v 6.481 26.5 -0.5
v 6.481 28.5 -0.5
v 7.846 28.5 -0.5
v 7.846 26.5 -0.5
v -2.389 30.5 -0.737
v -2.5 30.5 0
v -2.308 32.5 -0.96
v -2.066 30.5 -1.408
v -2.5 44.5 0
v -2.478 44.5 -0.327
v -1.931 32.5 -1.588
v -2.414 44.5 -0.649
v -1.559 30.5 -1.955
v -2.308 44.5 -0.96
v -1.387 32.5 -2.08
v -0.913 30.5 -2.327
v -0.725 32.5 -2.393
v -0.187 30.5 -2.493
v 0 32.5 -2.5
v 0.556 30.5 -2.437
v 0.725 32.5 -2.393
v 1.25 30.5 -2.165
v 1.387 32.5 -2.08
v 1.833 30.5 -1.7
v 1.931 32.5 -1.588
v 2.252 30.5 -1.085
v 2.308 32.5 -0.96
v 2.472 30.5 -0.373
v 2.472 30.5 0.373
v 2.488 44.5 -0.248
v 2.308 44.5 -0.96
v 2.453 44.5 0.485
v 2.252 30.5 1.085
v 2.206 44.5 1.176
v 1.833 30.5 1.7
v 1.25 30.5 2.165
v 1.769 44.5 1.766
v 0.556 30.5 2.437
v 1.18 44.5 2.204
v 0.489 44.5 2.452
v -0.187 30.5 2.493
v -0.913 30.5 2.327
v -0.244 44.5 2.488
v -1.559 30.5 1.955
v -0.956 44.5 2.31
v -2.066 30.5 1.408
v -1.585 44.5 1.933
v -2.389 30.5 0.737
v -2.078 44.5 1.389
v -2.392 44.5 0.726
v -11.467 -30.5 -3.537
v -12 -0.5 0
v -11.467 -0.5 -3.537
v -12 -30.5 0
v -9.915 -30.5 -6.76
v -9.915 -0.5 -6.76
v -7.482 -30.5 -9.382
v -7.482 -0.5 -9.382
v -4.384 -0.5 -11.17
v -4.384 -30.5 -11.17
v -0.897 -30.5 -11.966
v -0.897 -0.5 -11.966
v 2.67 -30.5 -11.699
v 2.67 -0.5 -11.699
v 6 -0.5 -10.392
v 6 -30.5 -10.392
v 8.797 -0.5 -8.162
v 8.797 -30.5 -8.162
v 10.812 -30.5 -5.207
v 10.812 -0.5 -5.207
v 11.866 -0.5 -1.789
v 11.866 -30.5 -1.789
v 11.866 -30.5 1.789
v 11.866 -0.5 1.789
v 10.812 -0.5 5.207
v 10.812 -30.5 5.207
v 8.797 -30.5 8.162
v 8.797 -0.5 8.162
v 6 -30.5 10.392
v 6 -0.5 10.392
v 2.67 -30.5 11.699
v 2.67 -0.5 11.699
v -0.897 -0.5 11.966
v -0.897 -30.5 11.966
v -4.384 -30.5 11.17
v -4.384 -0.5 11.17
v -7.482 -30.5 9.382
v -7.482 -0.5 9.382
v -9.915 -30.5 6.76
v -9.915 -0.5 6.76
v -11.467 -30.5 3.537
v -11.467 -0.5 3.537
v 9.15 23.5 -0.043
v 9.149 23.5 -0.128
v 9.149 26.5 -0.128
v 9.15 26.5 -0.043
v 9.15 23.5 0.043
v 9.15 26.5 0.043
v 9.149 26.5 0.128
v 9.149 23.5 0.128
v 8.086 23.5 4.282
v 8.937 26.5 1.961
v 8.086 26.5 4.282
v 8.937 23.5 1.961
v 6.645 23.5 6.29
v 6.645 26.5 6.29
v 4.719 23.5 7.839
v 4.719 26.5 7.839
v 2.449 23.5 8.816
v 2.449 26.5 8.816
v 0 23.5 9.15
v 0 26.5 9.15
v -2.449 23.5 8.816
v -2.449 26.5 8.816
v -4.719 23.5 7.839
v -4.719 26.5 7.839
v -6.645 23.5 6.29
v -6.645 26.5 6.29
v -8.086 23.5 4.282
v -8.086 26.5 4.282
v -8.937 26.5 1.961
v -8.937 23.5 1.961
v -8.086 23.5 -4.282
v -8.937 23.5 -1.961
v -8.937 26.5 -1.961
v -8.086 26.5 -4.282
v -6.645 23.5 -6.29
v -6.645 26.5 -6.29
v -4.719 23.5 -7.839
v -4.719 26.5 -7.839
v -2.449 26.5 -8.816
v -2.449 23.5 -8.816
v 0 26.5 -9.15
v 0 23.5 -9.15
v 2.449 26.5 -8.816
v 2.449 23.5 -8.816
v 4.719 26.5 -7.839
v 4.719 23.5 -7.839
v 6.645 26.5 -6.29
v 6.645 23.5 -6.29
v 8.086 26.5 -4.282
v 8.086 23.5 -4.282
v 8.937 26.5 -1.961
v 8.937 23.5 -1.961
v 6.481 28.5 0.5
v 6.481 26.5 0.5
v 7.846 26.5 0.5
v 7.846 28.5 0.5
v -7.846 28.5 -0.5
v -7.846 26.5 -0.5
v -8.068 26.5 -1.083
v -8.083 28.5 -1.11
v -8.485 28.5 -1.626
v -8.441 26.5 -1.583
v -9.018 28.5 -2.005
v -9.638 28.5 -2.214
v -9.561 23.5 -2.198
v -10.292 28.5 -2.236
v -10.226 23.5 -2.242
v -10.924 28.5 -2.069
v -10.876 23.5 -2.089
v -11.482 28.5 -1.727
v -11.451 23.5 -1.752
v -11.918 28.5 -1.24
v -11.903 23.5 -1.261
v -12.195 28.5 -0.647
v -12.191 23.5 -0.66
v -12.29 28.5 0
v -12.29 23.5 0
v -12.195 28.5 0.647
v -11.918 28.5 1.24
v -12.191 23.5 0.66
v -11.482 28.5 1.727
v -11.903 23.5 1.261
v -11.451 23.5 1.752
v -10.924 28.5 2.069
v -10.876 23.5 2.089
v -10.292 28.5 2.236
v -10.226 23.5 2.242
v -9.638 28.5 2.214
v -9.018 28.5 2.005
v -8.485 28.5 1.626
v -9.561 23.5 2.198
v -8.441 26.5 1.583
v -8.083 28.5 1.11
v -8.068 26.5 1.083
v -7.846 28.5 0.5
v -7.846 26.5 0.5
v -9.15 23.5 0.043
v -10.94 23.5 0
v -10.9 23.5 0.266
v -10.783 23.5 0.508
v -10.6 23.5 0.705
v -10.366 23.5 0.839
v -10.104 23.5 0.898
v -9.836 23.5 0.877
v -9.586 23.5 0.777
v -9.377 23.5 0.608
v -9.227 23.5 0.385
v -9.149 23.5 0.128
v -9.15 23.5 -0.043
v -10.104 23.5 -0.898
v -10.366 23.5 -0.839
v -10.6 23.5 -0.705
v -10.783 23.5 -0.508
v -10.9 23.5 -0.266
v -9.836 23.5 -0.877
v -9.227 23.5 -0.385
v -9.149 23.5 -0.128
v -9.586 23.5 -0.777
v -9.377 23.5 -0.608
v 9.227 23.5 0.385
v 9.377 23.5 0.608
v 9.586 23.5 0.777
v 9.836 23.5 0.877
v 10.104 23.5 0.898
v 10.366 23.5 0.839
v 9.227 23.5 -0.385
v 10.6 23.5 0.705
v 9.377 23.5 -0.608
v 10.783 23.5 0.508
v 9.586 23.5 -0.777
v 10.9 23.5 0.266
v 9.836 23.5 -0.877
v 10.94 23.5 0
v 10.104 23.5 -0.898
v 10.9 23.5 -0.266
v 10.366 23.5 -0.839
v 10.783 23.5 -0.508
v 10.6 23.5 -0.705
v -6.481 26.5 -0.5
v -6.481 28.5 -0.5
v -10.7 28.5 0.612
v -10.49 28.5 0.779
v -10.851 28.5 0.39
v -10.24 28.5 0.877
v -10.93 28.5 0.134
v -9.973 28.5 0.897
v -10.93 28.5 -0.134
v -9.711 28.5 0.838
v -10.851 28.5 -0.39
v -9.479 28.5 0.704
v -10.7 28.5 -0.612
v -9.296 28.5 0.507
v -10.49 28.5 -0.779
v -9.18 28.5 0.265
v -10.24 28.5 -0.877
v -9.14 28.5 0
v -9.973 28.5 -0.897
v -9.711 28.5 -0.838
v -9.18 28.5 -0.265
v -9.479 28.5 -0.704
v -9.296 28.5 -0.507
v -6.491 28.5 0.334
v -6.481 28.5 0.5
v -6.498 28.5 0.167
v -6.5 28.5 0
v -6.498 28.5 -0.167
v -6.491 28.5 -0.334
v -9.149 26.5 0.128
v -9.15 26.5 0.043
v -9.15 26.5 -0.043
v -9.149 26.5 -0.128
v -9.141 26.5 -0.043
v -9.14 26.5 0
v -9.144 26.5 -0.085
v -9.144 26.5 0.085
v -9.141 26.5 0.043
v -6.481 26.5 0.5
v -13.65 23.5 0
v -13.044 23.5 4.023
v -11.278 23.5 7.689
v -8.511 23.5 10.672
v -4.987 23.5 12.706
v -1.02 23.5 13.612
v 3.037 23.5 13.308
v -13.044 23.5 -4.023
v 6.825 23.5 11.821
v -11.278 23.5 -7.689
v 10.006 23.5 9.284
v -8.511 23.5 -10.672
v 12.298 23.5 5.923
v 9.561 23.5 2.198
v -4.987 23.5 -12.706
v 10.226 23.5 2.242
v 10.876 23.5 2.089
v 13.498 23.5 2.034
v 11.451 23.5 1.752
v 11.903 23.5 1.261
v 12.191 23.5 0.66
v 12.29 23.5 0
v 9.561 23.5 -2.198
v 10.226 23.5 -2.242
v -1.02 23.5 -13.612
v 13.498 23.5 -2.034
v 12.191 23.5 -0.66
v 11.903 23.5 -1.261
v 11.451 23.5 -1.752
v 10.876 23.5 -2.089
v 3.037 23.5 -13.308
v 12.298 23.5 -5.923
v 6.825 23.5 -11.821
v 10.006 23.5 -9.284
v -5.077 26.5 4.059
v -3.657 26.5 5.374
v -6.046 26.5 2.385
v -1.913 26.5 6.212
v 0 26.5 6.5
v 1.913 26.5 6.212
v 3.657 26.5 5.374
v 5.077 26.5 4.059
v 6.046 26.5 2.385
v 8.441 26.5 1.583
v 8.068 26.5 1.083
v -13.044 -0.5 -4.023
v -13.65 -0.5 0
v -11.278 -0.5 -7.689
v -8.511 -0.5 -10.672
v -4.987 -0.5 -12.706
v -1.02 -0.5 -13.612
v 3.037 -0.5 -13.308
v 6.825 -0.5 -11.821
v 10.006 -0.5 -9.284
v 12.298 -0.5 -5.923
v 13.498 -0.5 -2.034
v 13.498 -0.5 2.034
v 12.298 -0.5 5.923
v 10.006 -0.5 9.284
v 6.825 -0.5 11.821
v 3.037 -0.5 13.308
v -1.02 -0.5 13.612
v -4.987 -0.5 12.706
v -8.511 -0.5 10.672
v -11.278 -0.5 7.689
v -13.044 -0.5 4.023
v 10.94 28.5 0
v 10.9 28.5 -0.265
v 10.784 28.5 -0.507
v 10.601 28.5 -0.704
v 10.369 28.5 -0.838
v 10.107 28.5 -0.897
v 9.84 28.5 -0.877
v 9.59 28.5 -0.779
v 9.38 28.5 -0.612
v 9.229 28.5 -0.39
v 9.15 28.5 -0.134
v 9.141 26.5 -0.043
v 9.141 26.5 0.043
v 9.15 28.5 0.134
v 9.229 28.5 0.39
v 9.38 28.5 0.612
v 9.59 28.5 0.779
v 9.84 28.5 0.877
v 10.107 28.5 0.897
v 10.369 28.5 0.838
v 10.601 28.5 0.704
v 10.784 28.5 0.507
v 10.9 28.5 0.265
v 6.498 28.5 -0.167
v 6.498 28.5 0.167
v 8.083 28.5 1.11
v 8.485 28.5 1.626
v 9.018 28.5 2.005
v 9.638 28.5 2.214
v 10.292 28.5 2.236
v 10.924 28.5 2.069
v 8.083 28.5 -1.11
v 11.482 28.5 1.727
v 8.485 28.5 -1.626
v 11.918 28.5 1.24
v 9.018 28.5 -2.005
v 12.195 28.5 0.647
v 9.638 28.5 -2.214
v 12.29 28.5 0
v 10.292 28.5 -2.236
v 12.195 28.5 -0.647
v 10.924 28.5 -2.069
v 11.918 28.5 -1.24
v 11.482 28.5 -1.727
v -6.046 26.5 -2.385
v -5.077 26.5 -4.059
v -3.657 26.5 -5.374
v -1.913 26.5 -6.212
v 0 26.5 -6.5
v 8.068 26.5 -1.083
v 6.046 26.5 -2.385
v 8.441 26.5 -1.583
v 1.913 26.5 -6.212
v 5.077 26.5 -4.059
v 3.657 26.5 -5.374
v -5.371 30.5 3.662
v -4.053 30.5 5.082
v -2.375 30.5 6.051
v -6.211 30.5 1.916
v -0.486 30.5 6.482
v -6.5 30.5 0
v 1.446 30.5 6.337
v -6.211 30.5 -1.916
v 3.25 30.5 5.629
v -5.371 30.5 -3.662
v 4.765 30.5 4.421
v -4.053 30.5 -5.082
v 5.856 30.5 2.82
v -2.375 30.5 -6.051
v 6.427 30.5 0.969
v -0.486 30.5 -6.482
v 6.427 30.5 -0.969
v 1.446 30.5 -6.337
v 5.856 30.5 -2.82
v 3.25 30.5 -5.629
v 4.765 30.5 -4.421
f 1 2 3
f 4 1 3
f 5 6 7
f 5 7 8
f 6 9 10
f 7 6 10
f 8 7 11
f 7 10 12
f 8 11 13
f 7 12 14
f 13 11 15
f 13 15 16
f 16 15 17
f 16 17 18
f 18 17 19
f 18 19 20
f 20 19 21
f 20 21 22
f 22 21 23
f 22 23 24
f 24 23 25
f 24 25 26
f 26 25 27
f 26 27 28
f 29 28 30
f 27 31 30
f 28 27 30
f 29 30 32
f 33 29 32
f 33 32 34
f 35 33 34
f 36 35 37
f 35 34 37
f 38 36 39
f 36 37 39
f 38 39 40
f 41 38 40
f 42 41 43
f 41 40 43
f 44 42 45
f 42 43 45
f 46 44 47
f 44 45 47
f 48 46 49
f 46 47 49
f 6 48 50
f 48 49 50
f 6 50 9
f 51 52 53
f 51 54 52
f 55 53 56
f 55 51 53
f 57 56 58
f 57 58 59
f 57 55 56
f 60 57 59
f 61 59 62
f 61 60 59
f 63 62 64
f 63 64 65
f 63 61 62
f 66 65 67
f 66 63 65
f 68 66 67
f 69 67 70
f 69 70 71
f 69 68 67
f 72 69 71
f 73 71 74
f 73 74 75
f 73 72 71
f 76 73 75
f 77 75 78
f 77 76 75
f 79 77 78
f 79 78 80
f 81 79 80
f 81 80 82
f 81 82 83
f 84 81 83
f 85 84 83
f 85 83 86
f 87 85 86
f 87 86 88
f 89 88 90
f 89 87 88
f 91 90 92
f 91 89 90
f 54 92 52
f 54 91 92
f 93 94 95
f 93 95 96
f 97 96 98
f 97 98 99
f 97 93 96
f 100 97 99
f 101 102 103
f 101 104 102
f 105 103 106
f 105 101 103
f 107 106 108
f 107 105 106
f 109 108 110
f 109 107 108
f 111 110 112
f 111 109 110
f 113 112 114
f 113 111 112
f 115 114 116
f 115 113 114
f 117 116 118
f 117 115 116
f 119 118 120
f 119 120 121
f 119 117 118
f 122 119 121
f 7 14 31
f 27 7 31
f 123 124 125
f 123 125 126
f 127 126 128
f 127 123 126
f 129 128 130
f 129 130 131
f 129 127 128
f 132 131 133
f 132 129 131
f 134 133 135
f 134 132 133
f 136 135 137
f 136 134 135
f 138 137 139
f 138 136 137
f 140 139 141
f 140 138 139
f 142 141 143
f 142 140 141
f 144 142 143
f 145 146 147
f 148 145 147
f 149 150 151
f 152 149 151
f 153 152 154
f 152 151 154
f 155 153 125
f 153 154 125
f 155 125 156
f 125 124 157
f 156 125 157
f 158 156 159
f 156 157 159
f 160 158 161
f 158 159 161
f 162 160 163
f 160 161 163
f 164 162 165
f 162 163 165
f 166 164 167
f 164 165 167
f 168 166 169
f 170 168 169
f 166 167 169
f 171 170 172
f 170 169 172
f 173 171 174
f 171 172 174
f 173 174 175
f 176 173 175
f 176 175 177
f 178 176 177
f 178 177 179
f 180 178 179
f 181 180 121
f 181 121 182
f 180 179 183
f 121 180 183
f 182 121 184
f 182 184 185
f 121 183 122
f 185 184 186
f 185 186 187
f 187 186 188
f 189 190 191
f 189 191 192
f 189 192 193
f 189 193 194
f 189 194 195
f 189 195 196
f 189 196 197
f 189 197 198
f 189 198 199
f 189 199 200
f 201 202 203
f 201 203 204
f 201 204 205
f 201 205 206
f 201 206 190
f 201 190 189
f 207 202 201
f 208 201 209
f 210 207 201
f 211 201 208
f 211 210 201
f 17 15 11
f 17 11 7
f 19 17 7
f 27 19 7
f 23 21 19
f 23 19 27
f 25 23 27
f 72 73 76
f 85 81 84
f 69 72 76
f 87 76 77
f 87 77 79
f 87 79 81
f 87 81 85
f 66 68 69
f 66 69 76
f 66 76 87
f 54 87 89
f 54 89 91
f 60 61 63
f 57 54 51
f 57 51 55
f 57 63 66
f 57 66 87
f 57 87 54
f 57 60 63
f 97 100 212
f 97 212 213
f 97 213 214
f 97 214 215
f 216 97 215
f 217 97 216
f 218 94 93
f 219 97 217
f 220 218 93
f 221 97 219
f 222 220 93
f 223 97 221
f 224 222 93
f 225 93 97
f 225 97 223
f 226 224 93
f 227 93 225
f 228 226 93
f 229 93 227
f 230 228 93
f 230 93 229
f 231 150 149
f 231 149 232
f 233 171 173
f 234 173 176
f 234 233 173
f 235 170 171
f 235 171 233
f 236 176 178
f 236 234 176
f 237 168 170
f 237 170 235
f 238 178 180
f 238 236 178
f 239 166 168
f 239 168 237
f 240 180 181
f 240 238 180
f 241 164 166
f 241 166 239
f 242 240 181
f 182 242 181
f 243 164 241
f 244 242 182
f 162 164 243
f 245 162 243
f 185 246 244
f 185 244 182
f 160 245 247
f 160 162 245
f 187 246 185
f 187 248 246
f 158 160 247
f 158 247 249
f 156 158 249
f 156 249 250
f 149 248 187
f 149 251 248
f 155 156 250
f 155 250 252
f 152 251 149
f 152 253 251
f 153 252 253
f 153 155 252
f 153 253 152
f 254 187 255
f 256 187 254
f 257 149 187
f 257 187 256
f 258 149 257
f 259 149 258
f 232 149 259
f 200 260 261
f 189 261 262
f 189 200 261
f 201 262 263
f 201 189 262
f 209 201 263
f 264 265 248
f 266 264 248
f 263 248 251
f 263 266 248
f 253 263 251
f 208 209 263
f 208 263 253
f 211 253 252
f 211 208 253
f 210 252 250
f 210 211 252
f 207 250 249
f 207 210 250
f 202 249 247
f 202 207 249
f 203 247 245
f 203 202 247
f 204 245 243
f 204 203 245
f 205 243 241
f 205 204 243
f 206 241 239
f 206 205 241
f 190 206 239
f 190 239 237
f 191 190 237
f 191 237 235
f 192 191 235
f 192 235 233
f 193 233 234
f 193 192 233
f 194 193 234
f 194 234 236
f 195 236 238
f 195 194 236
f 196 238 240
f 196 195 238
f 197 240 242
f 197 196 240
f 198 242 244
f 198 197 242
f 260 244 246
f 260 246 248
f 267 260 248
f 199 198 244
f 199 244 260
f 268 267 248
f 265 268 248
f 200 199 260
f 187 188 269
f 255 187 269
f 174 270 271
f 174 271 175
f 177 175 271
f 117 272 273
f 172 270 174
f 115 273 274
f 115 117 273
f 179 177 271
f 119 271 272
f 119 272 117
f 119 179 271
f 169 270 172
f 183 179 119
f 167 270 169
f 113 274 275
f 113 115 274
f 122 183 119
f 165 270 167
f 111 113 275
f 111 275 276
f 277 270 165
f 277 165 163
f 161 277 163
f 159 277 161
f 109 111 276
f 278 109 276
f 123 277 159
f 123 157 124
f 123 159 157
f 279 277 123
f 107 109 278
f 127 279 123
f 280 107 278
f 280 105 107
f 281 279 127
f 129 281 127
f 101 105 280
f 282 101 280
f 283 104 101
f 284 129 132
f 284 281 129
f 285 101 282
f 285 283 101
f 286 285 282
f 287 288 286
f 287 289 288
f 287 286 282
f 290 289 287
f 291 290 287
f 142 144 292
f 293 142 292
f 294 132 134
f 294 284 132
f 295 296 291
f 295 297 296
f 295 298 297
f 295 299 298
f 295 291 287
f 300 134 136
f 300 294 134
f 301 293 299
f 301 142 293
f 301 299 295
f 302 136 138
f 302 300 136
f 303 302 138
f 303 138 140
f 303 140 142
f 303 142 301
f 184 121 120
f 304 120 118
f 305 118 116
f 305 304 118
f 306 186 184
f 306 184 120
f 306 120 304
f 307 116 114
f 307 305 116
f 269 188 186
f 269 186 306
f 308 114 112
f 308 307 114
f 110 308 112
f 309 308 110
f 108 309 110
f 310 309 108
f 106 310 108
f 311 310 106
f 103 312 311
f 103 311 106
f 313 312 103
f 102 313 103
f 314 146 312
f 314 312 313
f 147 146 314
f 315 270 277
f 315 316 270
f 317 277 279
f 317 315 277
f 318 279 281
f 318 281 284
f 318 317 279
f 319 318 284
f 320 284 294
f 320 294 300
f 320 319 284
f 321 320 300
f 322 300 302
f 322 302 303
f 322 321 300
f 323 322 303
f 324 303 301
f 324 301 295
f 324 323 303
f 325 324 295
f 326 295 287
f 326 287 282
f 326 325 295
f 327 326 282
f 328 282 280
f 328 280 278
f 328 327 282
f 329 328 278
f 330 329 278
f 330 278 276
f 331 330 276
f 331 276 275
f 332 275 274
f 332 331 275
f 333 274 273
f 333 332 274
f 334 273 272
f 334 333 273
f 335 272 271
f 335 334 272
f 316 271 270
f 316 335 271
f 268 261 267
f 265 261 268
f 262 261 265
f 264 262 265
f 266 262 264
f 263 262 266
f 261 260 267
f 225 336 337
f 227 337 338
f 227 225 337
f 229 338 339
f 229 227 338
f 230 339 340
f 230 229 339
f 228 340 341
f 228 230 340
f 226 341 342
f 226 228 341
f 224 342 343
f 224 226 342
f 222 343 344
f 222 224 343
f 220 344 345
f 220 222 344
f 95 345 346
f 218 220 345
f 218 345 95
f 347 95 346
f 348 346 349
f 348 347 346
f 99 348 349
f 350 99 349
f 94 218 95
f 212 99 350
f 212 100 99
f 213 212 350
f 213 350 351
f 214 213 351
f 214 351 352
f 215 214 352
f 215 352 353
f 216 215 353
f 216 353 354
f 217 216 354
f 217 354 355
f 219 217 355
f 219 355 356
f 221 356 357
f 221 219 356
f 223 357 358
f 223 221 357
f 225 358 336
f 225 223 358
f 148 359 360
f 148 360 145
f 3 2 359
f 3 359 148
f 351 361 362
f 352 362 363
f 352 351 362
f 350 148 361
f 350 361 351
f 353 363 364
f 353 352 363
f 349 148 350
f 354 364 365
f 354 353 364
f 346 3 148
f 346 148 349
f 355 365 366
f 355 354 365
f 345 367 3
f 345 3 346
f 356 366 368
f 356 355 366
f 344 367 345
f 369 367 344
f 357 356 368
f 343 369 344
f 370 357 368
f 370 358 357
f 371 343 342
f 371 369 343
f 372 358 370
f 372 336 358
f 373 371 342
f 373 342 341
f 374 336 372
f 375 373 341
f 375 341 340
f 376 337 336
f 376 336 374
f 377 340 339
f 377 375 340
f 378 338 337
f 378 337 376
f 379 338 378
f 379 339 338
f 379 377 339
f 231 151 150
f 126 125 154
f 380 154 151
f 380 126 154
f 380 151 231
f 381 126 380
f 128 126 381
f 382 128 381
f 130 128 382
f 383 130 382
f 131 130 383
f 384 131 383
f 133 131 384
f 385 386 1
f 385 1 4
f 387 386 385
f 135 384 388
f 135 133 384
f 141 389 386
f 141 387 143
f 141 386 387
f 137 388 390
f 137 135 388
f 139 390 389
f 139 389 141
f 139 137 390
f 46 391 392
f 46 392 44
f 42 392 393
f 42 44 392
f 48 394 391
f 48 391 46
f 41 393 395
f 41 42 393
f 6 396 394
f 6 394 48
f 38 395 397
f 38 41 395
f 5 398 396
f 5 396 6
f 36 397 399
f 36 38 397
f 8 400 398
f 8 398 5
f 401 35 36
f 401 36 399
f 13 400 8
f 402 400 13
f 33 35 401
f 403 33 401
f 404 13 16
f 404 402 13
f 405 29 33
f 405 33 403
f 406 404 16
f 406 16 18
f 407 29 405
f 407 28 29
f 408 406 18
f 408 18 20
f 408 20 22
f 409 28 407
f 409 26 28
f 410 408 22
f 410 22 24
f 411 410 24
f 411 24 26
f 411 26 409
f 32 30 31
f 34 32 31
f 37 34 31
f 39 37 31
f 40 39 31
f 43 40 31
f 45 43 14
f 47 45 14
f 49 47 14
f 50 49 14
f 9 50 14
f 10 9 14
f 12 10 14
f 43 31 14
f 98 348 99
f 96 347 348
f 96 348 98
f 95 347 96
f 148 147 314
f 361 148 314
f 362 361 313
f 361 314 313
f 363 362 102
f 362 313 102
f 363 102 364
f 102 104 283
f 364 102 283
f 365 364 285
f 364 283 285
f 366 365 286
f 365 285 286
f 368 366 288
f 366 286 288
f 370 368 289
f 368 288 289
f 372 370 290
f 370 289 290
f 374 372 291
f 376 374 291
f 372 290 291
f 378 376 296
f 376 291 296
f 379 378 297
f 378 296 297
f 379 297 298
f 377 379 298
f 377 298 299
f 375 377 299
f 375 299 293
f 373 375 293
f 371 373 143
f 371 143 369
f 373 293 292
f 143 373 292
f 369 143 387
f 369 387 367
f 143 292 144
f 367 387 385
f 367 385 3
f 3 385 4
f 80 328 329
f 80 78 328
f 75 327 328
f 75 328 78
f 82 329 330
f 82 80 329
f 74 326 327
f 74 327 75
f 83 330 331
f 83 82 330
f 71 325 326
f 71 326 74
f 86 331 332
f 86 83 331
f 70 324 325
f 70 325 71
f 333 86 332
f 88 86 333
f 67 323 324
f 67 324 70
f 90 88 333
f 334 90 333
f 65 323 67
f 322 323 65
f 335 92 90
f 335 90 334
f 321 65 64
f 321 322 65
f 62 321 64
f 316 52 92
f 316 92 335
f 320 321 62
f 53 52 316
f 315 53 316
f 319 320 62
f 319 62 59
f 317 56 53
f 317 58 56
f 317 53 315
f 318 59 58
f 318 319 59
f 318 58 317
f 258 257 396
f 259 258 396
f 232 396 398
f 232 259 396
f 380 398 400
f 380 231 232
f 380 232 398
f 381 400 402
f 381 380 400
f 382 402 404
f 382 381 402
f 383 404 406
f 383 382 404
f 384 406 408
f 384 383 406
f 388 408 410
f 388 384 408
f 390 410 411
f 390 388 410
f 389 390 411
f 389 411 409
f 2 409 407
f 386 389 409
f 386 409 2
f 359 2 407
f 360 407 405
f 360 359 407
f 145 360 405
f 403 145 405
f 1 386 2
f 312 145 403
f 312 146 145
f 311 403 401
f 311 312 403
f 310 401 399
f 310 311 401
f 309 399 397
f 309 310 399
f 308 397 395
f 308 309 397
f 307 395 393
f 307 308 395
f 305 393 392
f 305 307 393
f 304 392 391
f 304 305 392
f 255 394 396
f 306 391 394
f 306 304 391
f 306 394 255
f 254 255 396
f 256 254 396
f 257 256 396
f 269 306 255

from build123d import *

# Parameters (mm, degrees)
CROQUIS1_W              = 2.5
CROQUIS1_H              = 14
CORTAR_EXTRUIR1_DEPTH   = 12
CROQUIS4_R              = 2.25
CROQUIS4_R_2            = 0.9
CROQUIS4_W              = 18
CROQUIS4_H              = 1
SALIENTE_EXTRUIR1_DEPTH = 5


with BuildPart() as part:
    # Croquis1 → Revolución1 (revolve)
    with BuildSketch(Plane.XY):
        with Locations((-1.25, 37.5)):
            Rectangle(CROQUIS1_W, CROQUIS1_H)
        Polygon((-12, -30.5), (0, -30.5), (0, 30.5), (-6.5, 30.5), (-6.5, 26.5), (-9.15, 26.5), (-9.15, 23.5), (-13.65, 23.5), (-13.65, -0.5), (-12, -0.5), align=None)
    revolve(axis=Axis((0, 65.687156563, 0), (0, -1, 0)))

    # Croquis2 → Cortar-Extruir1 (cut)
    with BuildSketch(Plane(origin=(0, 44.5, 0), x_dir=(1, 0, 0), z_dir=(0, 1, 0))):
        Polygon((-55.580517034, 0.96), (-2.308332732, 0.96), (2.308332732, 0.96), (55.580517034, 0.96), (55.580517034, 107.504368605), (-55.580517034, 107.504368605), align=None)
    extrude(amount=-CORTAR_EXTRUIR1_DEPTH, mode=Mode.SUBTRACT)

    # Croquis4 → Saliente-Extruir1 (add)
    with BuildSketch(Plane(origin=(0, 23.5, 0), x_dir=(1, 0, 0), z_dir=(0, 1, 0))):
        with Locations((-10.04, 0)):
            Circle(CROQUIS4_R)
        with Locations((-10.04, 0)):
            Circle(CROQUIS4_R_2, mode=Mode.SUBTRACT)
        with Locations((10.04, 0)):
            Circle(CROQUIS4_R)
        with Locations((10.04, 0)):
            Circle(CROQUIS4_R_2, mode=Mode.SUBTRACT)
        Rectangle(CROQUIS4_W, CROQUIS4_H)
    extrude(amount=SALIENTE_EXTRUIR1_DEPTH)


solid = part.part
